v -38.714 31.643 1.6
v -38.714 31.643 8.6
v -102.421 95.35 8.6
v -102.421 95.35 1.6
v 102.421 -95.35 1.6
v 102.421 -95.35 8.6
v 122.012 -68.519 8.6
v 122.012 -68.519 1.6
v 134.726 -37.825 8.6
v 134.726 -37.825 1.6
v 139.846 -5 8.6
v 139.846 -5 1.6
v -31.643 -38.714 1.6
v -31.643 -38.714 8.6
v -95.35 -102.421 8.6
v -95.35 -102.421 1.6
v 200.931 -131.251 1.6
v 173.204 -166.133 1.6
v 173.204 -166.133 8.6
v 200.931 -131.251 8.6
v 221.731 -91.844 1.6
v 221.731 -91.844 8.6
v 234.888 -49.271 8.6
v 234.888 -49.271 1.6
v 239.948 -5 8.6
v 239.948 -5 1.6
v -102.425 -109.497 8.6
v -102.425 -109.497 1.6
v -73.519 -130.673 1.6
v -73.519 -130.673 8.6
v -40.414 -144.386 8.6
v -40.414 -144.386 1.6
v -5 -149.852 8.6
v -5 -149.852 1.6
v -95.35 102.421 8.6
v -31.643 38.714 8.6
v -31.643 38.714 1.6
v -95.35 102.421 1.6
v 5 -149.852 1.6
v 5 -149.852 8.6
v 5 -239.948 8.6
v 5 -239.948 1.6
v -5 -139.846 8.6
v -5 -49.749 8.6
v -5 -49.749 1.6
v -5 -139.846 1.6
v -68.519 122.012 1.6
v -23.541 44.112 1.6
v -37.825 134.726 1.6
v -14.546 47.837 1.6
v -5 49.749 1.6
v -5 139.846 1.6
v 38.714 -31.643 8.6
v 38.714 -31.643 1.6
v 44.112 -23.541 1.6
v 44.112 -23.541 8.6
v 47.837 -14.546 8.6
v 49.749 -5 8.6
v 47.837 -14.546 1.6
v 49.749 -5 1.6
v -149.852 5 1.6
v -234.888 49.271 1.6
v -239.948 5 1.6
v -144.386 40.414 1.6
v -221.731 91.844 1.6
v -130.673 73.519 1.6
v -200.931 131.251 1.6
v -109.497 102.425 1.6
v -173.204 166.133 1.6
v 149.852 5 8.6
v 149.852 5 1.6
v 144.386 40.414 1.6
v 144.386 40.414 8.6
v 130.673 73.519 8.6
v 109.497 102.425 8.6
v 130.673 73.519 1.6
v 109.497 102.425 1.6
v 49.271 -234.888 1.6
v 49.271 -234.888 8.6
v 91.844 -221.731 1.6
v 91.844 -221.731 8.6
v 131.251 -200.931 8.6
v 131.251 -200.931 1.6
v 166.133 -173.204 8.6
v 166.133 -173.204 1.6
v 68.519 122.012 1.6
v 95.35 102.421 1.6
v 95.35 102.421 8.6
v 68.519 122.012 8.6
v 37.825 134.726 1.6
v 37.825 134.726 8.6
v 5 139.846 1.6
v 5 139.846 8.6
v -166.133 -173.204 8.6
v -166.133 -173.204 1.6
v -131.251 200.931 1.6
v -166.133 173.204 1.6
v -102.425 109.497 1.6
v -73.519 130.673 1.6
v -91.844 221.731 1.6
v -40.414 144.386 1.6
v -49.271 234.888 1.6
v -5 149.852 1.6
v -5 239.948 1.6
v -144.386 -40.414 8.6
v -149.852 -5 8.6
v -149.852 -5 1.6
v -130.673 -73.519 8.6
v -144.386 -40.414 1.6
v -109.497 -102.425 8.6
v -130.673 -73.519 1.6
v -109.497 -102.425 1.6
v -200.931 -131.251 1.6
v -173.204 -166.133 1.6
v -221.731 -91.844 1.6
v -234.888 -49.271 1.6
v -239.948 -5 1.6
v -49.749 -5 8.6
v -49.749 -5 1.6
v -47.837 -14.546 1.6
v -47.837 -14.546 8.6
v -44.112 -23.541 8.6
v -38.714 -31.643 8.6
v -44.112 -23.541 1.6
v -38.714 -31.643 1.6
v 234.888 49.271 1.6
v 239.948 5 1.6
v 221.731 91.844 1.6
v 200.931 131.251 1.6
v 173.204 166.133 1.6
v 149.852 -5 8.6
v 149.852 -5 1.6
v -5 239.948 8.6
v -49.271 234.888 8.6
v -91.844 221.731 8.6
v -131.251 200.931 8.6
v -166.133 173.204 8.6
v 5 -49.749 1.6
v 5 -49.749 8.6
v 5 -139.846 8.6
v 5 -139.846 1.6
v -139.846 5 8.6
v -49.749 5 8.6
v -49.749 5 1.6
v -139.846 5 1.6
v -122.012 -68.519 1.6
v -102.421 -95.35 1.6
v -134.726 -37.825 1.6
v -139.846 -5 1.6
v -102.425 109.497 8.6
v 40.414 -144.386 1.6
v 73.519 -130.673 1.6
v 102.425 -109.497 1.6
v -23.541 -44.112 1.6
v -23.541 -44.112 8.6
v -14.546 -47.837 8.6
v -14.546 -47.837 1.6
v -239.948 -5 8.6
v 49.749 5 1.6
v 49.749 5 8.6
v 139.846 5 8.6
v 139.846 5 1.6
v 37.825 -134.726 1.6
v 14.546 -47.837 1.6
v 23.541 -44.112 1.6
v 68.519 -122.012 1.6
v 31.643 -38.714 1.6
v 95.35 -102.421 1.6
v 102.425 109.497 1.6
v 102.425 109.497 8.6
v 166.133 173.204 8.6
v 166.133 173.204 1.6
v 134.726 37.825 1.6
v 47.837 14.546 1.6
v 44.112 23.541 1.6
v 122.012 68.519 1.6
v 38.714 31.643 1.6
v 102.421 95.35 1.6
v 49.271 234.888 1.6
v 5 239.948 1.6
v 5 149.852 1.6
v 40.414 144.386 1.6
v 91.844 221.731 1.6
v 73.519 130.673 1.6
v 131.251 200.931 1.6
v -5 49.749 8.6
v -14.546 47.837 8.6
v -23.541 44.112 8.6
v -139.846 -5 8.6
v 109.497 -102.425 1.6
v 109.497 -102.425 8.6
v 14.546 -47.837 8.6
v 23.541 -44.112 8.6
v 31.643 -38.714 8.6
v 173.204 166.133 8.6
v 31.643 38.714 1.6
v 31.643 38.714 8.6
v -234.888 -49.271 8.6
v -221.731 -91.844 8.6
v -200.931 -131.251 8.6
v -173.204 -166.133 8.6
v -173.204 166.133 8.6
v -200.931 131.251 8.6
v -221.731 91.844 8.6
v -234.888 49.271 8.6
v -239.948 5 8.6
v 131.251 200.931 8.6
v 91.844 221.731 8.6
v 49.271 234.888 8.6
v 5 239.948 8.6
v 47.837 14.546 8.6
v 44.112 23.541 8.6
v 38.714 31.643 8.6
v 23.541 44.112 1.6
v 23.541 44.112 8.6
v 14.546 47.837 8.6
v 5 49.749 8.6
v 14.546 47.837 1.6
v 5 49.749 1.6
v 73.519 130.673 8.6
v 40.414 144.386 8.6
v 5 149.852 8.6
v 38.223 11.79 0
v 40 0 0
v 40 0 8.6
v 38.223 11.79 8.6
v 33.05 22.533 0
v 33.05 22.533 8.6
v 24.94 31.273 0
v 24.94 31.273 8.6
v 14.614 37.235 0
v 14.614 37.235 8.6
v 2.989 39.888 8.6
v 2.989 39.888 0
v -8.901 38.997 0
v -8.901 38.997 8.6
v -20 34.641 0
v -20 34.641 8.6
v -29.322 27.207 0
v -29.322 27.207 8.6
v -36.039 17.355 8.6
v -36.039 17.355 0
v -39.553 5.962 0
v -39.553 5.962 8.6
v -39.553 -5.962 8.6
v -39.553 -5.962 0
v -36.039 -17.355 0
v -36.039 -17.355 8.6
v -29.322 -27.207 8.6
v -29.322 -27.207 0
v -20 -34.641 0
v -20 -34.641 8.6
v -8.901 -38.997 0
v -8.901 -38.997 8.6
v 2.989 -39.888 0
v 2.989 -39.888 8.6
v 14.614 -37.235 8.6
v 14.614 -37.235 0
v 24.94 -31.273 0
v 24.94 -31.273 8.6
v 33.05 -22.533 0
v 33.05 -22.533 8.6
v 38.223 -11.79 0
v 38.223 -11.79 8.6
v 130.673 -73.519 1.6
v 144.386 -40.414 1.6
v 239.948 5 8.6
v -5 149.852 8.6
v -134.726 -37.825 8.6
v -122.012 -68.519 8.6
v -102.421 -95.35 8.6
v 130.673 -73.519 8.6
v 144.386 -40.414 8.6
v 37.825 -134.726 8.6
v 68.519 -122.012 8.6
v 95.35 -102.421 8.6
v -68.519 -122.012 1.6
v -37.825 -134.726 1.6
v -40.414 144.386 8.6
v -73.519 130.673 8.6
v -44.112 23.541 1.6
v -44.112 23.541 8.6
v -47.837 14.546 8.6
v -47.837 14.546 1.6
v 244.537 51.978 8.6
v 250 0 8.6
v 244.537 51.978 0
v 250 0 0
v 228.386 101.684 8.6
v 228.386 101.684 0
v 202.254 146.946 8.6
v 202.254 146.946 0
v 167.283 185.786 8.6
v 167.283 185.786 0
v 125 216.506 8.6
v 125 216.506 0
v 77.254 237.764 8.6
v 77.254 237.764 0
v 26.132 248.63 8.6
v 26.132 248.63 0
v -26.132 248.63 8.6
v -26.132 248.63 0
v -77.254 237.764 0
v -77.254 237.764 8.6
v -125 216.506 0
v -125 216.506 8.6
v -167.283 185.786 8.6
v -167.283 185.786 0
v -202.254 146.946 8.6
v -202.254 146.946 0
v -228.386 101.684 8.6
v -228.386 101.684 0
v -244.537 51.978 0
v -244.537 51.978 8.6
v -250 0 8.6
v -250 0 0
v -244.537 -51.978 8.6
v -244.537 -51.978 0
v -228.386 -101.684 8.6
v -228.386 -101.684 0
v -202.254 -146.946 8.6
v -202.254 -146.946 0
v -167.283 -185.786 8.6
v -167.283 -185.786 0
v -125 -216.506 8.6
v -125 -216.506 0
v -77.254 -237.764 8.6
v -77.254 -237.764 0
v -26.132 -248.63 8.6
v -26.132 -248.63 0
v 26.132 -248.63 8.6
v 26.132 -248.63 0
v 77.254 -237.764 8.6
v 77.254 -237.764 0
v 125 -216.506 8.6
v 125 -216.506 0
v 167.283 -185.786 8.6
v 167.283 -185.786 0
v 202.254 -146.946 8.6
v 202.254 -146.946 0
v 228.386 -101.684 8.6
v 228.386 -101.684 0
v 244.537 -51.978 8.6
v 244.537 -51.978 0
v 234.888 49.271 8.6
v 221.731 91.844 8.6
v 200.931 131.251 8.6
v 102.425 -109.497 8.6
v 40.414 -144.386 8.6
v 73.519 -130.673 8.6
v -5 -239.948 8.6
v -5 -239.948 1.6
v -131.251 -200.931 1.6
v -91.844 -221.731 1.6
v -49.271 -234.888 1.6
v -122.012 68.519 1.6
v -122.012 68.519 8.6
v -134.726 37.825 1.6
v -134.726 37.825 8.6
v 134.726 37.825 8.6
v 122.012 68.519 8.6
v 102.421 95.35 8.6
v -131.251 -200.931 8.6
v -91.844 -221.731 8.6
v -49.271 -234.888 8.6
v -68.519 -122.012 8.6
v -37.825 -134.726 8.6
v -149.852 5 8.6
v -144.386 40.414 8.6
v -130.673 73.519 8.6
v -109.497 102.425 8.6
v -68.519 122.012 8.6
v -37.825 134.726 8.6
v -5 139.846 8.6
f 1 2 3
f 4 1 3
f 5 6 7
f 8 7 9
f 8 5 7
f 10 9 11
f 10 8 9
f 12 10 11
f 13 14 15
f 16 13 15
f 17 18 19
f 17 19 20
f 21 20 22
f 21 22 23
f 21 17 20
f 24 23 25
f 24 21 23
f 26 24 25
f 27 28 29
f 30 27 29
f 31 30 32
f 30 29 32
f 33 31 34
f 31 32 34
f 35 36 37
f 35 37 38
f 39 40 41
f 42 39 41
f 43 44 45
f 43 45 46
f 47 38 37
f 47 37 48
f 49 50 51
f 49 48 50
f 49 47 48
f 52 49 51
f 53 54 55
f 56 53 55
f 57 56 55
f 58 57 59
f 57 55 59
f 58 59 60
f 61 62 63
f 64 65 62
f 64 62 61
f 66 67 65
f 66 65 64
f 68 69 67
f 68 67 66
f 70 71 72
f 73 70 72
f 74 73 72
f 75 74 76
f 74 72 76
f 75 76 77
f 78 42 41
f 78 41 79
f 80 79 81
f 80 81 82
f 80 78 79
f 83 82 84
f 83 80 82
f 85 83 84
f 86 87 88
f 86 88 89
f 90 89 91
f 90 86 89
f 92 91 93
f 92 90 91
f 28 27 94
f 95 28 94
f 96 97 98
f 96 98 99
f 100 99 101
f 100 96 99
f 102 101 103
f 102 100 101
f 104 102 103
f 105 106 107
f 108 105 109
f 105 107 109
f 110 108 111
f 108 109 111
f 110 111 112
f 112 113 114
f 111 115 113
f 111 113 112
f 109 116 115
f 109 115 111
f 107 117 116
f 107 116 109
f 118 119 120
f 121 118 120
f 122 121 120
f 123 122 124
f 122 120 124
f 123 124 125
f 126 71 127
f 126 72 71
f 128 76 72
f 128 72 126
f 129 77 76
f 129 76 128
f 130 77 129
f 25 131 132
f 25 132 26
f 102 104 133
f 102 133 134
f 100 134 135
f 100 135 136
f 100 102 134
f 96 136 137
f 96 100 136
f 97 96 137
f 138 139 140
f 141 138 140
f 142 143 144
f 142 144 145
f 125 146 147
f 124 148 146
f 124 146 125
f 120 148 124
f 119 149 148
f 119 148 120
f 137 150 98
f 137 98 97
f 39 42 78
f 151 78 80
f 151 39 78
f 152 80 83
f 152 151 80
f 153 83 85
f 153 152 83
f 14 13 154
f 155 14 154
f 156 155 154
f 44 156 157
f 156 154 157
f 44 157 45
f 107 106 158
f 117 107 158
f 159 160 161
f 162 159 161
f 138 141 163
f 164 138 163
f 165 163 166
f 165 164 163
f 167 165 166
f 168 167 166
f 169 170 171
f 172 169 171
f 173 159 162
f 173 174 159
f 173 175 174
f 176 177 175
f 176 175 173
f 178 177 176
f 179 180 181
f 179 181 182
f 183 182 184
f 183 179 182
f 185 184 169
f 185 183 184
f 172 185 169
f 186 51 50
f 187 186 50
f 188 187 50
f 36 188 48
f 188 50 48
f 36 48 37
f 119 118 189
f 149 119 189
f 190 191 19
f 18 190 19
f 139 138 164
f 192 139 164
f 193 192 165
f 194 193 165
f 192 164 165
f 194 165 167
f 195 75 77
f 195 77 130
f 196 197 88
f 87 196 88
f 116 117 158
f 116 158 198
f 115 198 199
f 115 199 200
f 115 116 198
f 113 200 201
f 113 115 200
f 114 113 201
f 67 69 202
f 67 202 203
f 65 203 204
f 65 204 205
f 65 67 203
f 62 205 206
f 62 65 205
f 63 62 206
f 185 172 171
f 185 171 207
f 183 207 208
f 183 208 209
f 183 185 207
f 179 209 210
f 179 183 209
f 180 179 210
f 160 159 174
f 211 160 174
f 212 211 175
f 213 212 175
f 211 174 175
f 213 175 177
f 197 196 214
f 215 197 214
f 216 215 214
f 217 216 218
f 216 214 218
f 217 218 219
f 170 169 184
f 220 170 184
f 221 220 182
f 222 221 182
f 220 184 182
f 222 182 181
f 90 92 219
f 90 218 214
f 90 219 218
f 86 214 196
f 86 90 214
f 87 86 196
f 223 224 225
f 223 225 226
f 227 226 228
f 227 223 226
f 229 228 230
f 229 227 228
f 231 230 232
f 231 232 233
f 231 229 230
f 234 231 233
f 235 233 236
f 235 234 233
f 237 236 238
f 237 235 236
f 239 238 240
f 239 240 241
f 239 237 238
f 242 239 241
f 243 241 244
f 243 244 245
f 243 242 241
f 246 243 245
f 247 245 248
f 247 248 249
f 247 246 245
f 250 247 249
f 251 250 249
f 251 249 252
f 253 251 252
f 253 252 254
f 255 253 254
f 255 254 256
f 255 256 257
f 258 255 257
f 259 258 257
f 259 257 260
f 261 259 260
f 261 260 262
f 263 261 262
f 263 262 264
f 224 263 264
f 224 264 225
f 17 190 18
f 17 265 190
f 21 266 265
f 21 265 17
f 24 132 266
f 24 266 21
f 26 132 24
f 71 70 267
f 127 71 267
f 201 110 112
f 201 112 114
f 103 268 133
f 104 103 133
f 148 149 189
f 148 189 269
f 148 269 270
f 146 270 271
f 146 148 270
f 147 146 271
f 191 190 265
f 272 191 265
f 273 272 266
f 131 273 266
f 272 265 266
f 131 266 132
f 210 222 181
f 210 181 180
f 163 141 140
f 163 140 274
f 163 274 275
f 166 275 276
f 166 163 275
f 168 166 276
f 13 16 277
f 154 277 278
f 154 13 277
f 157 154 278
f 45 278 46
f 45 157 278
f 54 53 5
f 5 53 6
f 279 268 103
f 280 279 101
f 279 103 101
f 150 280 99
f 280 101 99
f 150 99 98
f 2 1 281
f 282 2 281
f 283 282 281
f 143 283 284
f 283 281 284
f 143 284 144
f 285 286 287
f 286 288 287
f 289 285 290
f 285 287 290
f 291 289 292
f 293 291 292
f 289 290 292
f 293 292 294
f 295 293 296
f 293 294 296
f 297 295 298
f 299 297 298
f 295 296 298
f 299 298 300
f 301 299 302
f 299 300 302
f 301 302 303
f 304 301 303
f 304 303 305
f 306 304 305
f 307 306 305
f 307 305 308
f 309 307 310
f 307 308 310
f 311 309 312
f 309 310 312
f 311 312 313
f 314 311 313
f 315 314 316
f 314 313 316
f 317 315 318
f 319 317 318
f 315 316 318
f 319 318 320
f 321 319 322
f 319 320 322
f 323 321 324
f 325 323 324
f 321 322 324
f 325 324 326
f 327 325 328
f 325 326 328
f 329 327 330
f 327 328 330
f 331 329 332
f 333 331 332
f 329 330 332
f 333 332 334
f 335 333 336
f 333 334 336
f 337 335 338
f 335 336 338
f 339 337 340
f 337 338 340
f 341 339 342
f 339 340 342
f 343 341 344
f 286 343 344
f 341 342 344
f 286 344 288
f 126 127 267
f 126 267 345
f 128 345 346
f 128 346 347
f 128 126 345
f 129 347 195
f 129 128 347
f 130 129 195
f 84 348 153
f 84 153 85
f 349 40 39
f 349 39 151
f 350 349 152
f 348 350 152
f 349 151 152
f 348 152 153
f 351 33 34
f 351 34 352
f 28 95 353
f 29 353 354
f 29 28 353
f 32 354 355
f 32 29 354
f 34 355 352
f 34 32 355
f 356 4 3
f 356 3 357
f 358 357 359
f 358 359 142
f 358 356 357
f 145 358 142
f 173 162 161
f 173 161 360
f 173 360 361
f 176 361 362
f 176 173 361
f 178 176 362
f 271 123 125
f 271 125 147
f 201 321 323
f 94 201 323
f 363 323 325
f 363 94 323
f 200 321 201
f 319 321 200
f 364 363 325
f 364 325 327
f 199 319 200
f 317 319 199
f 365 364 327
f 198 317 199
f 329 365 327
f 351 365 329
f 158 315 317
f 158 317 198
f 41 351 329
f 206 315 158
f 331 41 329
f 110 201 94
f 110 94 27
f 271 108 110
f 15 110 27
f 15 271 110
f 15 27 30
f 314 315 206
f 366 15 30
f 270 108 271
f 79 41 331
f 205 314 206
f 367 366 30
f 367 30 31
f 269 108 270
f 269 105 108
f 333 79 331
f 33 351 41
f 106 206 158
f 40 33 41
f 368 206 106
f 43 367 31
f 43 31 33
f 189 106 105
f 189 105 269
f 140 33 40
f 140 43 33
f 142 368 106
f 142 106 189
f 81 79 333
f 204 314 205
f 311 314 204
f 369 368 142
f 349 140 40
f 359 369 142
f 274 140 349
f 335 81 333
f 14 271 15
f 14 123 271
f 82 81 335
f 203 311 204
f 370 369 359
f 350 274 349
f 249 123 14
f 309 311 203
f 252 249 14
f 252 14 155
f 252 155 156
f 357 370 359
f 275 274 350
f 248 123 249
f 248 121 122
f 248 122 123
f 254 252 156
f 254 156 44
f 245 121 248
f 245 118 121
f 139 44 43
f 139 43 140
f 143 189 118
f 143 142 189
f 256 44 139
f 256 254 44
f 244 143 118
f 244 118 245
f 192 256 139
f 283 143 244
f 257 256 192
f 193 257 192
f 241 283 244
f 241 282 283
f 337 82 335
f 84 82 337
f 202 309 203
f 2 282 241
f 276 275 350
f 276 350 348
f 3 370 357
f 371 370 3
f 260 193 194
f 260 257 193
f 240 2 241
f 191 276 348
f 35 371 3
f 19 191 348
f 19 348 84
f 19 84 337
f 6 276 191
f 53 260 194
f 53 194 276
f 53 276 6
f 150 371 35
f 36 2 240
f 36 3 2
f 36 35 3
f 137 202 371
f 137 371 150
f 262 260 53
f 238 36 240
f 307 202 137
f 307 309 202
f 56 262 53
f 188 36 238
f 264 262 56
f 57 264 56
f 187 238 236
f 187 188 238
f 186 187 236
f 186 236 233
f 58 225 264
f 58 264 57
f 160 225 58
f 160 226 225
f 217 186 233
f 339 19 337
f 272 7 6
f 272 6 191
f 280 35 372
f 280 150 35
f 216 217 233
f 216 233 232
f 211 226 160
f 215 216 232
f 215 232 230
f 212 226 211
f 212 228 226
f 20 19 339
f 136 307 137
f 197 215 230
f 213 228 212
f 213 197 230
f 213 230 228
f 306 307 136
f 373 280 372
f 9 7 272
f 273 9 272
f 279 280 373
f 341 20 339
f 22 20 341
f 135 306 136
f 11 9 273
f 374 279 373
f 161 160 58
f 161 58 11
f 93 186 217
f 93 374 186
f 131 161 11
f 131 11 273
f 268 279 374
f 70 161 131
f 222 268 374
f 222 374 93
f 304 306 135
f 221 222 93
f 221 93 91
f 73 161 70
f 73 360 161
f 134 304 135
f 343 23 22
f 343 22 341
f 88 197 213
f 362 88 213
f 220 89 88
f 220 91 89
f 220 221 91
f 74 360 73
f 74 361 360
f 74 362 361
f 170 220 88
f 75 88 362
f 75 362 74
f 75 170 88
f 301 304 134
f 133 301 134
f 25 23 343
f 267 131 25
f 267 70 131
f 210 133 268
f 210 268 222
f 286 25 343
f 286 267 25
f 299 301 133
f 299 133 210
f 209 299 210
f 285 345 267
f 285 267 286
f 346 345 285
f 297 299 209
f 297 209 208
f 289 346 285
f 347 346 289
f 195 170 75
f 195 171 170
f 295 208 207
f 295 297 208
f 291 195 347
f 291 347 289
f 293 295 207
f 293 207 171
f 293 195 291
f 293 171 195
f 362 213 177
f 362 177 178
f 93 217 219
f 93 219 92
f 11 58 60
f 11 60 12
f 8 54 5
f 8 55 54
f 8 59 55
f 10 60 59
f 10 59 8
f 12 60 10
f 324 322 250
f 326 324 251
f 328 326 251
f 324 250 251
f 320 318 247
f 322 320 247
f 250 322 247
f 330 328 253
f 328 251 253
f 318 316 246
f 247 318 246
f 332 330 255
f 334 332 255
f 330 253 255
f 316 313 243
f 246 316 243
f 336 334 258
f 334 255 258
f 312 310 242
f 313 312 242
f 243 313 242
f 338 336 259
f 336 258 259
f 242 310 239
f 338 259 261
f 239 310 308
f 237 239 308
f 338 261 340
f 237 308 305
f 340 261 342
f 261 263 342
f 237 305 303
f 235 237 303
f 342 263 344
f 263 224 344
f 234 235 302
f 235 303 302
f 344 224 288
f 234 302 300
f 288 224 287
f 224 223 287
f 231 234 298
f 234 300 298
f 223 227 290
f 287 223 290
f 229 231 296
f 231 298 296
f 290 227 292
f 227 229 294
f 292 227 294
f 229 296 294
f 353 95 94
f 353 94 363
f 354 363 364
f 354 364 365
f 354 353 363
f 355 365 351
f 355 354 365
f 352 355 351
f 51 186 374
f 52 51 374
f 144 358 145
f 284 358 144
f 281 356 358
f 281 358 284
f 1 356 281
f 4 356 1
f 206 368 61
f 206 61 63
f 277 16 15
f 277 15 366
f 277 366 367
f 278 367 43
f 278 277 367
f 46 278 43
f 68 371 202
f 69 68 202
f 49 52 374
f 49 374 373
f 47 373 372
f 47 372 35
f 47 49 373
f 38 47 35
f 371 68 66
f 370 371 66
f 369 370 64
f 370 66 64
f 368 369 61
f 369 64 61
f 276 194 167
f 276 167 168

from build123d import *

# Parameters (mm, degrees)
SKETCH1_R           = 250
SKETCH1_R_2         = 40
BOSS_EXTRUDE1_DEPTH = 1.6
SKETCH3_R           = 250
SKETCH3_R_2         = 240
SKETCH3_R_3         = 50
SKETCH3_R_4         = 40
BOSS_EXTRUDE2_DEPTH = 7
RIB2_REACH          = 355.658
SKETCH4_WALLS_W     = 899.315940722
SKETCH4_WALLS_H     = 10
CIRPATTERN1_COUNT   = 8
EXTRUDE_THIN1_START = -7
SKETCH5_R           = 149.934912721
SKETCH5_R_2         = 139.934912721
EXTRUDE_THIN1_DEPTH = 7


with BuildPart() as part:
    # Sketch1 → Boss-Extrude1 (new body)
    with BuildSketch(Plane.XY):
        Circle(SKETCH1_R)
        Circle(SKETCH1_R_2, mode=Mode.SUBTRACT)
    extrude(amount=BOSS_EXTRUDE1_DEPTH)

    # Sketch3 → Boss-Extrude2 (add)
    # profile 1 of 2: a face of its own
    with BuildSketch(Plane.XY.offset(1.6)):
        Circle(SKETCH3_R)
        Circle(SKETCH3_R_2, mode=Mode.SUBTRACT)
    # profile 2 of 2: a face of its own
    with BuildSketch(Plane.XY.offset(1.6)):
        Circle(SKETCH3_R_3)
        Circle(SKETCH3_R_4, mode=Mode.SUBTRACT)
    extrude(amount=BOSS_EXTRUDE2_DEPTH)

    # Sketch4 walls → Rib2 (add, up to next)
    with BuildSketch(Plane.XY.offset(8.6), mode=Mode.PRIVATE) as rib2_sk1:
        with Locations((145, 0)):
            Rectangle(SKETCH4_WALLS_W, SKETCH4_WALLS_H)
    rib2_tool1 = extrude(rib2_sk1.sketch, amount=-RIB2_REACH, mode=Mode.PRIVATE) - part.part
    rib2 = rib2_tool1.solids().sort_by_distance((145, 0, 8.6))[0]
    add(rib2)

    # CirPattern1: Rib2 ×8 about axis
    cirpattern1_axis = Axis((0, 0, 0), (0, 0, 1))
    for i in range(1, CIRPATTERN1_COUNT):
        add(rib2.rotate(cirpattern1_axis, i * 360 / CIRPATTERN1_COUNT))

    # Sketch5 → Extrude-Thin1 (add)
    with BuildSketch(Plane.XY.offset(8.6).offset(EXTRUDE_THIN1_START)):
        Circle(SKETCH5_R)
        Circle(SKETCH5_R_2, mode=Mode.SUBTRACT)
    extrude(amount=EXTRUDE_THIN1_DEPTH)


solid = part.part
